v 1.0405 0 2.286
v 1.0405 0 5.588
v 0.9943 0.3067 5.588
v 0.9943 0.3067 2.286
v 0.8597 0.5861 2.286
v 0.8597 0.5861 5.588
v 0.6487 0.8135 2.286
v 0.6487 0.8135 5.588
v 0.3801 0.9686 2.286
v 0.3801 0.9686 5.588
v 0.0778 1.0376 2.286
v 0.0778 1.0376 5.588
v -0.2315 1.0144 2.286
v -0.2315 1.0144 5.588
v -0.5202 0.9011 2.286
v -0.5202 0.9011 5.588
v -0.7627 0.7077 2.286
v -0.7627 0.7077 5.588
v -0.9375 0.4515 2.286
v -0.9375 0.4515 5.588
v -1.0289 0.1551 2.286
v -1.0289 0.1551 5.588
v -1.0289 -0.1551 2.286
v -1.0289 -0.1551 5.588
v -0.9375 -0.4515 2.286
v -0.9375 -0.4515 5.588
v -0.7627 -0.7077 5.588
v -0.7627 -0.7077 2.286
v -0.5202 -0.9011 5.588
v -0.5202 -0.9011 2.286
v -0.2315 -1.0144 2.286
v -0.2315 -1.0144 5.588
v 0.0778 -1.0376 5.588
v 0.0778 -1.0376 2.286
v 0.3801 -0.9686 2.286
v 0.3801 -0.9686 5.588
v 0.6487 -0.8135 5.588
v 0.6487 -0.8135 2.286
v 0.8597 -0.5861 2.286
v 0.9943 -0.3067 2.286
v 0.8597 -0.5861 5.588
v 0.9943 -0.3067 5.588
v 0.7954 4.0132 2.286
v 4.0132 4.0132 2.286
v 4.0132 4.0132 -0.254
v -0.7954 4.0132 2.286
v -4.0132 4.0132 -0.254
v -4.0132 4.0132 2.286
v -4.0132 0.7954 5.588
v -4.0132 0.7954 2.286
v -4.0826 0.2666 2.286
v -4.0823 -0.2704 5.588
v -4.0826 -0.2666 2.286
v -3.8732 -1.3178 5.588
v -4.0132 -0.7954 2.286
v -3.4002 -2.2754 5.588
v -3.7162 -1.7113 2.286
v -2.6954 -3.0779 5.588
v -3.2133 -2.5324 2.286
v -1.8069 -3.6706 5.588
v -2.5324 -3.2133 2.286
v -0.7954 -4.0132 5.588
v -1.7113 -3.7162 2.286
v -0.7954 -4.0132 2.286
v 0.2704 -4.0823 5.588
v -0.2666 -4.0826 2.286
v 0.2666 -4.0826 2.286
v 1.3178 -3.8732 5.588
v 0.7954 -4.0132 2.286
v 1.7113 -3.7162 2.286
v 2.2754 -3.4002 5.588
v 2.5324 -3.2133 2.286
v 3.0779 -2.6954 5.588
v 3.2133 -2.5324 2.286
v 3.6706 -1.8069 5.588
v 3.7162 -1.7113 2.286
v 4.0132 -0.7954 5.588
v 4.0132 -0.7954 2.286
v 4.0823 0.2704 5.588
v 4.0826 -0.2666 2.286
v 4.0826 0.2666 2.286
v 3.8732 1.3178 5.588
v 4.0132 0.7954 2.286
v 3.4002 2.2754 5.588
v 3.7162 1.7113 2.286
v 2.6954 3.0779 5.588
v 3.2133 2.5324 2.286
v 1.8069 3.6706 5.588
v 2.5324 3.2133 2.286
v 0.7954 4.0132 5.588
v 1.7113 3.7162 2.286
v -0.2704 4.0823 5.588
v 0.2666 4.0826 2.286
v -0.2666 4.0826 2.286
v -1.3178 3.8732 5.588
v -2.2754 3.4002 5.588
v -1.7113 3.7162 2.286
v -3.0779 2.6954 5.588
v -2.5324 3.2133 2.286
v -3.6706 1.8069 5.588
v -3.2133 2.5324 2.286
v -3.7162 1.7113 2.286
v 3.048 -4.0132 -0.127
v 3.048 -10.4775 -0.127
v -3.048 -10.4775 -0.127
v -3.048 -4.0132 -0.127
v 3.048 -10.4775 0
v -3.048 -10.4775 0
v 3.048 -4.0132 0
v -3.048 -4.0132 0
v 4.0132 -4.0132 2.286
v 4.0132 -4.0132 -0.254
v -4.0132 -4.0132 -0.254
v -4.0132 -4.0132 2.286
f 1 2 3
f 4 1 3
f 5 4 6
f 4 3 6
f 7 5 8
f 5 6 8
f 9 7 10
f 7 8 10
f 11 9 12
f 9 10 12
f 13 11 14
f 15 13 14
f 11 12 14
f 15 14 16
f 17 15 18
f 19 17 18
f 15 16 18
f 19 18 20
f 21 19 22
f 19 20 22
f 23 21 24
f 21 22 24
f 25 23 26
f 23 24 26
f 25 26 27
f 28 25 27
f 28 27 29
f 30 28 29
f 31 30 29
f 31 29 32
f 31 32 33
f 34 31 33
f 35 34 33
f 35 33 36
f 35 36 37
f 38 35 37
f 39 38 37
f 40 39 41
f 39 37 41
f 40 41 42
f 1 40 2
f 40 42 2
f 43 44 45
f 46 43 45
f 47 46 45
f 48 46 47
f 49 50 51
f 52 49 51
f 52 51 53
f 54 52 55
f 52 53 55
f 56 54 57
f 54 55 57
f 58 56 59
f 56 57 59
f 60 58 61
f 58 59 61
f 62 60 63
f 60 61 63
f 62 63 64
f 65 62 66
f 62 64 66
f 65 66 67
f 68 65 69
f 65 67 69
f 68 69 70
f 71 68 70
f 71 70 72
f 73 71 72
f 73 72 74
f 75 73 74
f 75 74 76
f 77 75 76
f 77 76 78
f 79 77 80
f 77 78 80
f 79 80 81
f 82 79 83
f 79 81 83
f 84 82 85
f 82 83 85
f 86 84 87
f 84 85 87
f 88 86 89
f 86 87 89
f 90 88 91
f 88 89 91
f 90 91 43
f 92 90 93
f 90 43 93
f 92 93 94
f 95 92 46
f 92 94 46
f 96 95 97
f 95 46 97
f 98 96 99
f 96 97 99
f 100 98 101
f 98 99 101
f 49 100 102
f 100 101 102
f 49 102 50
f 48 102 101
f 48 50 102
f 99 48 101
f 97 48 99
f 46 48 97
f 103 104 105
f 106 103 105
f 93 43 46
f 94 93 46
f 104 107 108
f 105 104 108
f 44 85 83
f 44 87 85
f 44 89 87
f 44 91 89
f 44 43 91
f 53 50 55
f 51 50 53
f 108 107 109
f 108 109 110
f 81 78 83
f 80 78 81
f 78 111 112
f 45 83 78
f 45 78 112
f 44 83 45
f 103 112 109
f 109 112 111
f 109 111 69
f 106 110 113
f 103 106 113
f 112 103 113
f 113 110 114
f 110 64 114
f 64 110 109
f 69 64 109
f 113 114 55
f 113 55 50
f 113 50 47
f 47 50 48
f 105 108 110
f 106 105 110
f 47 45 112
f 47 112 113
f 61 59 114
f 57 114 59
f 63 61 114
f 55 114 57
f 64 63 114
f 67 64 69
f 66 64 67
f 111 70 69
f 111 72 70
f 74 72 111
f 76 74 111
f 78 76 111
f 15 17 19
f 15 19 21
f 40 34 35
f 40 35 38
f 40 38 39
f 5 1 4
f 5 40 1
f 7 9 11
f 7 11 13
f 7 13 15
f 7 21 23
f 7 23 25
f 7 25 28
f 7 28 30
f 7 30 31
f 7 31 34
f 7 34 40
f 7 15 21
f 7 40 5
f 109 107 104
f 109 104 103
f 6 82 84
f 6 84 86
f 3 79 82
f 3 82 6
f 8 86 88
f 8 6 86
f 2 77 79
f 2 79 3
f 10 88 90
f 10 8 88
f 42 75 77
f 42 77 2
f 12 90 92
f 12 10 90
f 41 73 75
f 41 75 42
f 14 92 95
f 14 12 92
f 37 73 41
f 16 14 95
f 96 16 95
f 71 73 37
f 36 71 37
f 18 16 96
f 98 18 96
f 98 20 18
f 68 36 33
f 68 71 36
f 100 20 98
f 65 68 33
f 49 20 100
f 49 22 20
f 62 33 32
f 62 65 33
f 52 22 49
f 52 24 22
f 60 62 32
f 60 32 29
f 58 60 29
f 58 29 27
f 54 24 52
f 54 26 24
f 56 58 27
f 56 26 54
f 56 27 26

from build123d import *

# Parameters (mm, degrees)
SKETCH1_W           = 8.0264
SKETCH1_H           = 8.0264
BOSS_EXTRUDE1_DEPTH = 2.286
SKETCH2_R           = 4.091254354
BOSS_EXTRUDE2_DEPTH = 3.302
SKETCH3_R           = 1.040494651
CUT_EXTRUDE1_DEPTH  = 3.302
SKETCH8_W           = 6.096
SKETCH8_H           = 13.5255
BOSS_EXTRUDE6_DEPTH = 0.127
SKETCH9_W           = 8.0264
SKETCH9_H           = 8.0264
BOSS_EXTRUDE7_DEPTH = 0.254


with BuildPart() as part:
    # Sketch1 → Boss-Extrude1 (new body)
    with BuildSketch(Plane.XY):
        Rectangle(SKETCH1_W, SKETCH1_H)
    extrude(amount=BOSS_EXTRUDE1_DEPTH)

    # Sketch2 → Boss-Extrude2 (add)
    with BuildSketch(Plane.XY.offset(2.286)):
        with Locations(Location((0, 0, 0), (0, 0, 168.79012288))):
            Circle(SKETCH2_R)
    extrude(amount=BOSS_EXTRUDE2_DEPTH)

    # Sketch3 → Cut-Extrude1 (cut)
    with BuildSketch(Plane.XY.offset(5.588)):
        Circle(SKETCH3_R)
    extrude(amount=-CUT_EXTRUDE1_DEPTH, mode=Mode.SUBTRACT)

    # Sketch8 → Boss-Extrude6 (add)
    with BuildSketch(Plane(origin=(0, 0, 0), x_dir=(-1, 0, 0), z_dir=(0, 0, -1))):
        with Locations((0, -3.71475)):
            Rectangle(SKETCH8_W, SKETCH8_H)
    extrude(amount=BOSS_EXTRUDE6_DEPTH)

    # Sketch9 → Boss-Extrude7 (add)
    with BuildSketch(Plane(origin=(0, 0, 0), x_dir=(-1, 0, 0), z_dir=(0, 0, -1))):
        Rectangle(SKETCH9_W, SKETCH9_H)
    extrude(amount=BOSS_EXTRUDE7_DEPTH)


solid = part.part
